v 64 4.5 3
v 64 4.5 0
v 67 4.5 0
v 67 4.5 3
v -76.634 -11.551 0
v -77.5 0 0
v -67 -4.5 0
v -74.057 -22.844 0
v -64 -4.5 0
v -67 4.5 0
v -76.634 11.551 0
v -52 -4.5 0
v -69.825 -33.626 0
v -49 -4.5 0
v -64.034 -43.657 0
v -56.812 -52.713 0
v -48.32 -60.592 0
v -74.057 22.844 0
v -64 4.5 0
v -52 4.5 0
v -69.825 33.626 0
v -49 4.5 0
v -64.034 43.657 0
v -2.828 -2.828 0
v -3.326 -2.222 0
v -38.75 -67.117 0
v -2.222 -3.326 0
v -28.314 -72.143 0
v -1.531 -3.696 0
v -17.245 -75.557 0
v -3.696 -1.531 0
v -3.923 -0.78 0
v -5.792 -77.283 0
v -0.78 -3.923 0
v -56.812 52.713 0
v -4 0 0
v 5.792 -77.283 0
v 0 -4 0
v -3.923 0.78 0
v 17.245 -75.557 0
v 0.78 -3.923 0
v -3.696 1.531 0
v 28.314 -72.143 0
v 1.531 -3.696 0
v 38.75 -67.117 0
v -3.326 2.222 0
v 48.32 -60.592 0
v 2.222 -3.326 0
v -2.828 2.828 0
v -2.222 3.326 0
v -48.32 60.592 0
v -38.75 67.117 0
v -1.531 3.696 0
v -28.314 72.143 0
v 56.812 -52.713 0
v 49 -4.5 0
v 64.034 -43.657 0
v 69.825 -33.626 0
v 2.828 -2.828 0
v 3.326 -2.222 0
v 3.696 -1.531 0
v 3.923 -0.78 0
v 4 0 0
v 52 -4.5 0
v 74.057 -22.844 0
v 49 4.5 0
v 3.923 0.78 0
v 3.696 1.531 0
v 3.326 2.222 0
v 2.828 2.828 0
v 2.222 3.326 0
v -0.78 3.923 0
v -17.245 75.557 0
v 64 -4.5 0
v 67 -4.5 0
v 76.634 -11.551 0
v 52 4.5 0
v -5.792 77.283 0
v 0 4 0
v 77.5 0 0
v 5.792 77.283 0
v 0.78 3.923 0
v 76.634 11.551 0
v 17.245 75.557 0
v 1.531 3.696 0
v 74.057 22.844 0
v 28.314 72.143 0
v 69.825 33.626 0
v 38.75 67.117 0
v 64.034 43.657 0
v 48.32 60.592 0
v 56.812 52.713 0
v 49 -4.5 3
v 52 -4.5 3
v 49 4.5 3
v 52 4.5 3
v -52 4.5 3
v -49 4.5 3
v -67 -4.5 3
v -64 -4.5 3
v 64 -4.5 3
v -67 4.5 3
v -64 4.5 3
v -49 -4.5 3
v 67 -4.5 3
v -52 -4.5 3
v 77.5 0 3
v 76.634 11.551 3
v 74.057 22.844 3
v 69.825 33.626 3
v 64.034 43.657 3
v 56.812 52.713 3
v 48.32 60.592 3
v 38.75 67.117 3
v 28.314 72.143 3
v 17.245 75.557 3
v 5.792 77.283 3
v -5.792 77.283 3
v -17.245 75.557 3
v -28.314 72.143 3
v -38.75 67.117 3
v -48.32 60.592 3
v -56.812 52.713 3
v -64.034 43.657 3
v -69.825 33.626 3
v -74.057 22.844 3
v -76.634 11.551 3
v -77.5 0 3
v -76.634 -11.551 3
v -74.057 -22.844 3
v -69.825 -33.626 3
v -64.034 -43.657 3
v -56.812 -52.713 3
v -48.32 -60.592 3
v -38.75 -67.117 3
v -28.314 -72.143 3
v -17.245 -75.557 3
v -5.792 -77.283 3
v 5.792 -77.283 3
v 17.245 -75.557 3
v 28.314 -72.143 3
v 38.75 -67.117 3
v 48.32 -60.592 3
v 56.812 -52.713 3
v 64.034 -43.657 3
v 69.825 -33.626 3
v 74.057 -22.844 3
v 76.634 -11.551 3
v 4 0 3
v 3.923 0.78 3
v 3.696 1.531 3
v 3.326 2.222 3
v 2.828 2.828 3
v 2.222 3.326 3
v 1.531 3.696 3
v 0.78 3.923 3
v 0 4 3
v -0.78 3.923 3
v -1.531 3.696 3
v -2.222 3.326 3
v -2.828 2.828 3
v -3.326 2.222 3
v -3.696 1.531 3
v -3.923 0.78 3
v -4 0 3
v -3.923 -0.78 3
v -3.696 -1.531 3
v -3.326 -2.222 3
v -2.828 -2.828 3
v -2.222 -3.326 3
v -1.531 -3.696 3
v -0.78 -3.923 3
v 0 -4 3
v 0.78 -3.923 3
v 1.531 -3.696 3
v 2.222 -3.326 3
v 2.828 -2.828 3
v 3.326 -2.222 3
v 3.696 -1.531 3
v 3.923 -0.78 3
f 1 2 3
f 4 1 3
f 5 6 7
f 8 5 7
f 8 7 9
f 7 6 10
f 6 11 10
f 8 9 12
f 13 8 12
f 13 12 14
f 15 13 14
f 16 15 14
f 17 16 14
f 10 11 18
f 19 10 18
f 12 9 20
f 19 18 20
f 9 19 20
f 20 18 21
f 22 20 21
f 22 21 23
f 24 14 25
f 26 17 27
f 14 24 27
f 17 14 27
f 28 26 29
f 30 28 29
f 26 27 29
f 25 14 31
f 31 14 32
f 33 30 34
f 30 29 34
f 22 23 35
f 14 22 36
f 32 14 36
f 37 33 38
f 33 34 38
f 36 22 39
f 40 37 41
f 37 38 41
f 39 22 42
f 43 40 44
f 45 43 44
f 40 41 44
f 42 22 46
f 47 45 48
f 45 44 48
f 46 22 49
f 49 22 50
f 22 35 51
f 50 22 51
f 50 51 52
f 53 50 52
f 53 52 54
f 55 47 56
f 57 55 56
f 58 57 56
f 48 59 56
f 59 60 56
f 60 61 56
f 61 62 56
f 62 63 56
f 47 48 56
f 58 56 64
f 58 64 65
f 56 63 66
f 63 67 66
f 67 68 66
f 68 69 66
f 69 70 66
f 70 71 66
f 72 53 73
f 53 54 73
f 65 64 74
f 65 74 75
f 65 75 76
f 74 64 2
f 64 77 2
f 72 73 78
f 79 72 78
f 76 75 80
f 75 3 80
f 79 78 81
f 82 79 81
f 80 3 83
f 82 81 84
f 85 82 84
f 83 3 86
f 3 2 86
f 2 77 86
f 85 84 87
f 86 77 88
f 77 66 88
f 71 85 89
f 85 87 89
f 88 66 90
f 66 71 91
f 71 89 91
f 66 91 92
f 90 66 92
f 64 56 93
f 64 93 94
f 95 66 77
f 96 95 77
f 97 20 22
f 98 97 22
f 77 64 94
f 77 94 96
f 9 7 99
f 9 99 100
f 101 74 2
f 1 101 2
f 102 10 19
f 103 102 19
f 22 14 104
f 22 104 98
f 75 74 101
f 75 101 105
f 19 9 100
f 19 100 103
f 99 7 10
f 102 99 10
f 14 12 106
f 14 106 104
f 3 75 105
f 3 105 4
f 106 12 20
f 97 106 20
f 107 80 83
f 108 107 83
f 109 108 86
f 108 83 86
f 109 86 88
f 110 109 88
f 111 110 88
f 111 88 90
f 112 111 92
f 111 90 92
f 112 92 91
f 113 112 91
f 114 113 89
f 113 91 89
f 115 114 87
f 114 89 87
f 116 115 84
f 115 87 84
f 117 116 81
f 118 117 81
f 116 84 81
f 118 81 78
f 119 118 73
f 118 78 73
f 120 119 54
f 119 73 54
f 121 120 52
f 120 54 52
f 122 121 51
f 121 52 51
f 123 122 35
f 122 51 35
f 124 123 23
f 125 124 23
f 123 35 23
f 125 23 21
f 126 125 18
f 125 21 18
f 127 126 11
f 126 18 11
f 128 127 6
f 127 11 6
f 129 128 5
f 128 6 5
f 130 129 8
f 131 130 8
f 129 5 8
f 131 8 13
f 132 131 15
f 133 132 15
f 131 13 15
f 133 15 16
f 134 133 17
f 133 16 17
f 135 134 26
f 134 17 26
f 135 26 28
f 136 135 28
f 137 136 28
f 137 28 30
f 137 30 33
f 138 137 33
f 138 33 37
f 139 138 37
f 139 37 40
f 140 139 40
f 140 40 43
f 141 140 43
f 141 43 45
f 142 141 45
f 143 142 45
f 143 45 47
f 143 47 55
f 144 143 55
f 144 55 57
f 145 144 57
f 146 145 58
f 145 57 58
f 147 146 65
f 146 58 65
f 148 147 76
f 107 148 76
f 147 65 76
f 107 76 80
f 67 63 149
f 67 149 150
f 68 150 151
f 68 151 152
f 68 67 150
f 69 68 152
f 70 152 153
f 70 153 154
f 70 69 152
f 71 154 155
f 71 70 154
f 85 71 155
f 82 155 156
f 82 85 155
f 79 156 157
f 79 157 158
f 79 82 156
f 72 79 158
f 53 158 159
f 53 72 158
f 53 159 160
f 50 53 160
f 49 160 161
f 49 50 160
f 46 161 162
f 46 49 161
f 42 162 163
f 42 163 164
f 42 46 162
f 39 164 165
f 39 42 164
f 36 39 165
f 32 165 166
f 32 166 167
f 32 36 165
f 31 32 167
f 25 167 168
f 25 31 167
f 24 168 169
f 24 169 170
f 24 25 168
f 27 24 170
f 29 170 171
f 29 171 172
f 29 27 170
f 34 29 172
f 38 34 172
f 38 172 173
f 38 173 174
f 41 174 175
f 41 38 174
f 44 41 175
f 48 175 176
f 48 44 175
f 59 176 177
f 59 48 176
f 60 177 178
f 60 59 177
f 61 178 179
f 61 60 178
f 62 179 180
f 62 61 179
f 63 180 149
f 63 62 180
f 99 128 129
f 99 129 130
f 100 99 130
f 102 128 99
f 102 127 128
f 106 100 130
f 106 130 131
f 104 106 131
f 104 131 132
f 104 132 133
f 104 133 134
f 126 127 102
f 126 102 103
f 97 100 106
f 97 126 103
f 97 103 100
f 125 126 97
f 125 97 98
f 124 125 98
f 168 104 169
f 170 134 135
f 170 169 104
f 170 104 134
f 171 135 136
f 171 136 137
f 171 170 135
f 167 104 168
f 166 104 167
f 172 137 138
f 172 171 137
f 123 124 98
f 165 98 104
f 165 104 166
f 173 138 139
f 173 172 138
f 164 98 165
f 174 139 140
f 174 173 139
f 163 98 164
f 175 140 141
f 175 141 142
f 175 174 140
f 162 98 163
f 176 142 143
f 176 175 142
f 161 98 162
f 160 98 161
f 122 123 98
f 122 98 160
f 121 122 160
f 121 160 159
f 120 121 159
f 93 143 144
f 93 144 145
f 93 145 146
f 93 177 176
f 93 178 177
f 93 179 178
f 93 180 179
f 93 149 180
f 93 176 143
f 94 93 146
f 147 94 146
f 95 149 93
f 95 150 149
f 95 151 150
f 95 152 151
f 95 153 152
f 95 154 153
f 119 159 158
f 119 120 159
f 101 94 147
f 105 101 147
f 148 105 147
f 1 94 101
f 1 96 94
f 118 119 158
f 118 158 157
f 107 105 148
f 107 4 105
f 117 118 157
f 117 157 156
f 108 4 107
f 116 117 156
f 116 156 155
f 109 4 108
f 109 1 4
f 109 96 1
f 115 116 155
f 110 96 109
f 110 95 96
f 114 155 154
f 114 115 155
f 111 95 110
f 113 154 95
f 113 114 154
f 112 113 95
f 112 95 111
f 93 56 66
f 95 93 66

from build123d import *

# Parameters (mm, degrees)
BOX127_W          = 3
BOX127_H          = 9
BOX127_DEPTH      = 3
BOX128_W          = 3
BOX128_H          = 9
BOX128_DEPTH      = 3
BOX_W             = 3
BOX_H             = 9
BOX_DEPTH         = 3
BOX126_W          = 3
BOX126_H          = 9
BOX126_DEPTH      = 3
CYLINDER017_R     = 4
CYLINDER017_DEPTH = 3
CYLINDER_R        = 77.5
CYLINDER_DEPTH    = 3


with BuildPart() as cube049:
    # Box127 → Box127 (new body)
    with BuildSketch(Plane(origin=(49, -4.5, 0), x_dir=(1, 0, 0), z_dir=(0, 0, 1))):
        with Locations((1.5, 4.5)):
            Rectangle(BOX127_W, BOX127_H)
    extrude(amount=BOX127_DEPTH)


with BuildPart() as cube050:
    # Box128 → Box128 (new body)
    with BuildSketch(Plane(origin=(64, -4.5, 0), x_dir=(1, 0, 0), z_dir=(0, 0, 1))):
        with Locations((1.5, 4.5)):
            Rectangle(BOX128_W, BOX128_H)
    extrude(amount=BOX128_DEPTH)


with BuildPart() as cube:
    # Box → Box (new body)
    with BuildSketch(Plane(origin=(-52, -4.5, 0), x_dir=(1, 0, 0), z_dir=(0, 0, 1))):
        with Locations((1.5, 4.5)):
            Rectangle(BOX_W, BOX_H)
    extrude(amount=BOX_DEPTH)


with BuildPart() as cube048:
    # Box126 → Box126 (new body)
    with BuildSketch(Plane(origin=(-67, -4.5, 0), x_dir=(1, 0, 0), z_dir=(0, 0, 1))):
        with Locations((1.5, 4.5)):
            Rectangle(BOX126_W, BOX126_H)
    extrude(amount=BOX126_DEPTH)


with BuildPart() as cylinder001:
    # Cylinder017 → Cylinder017 (new body)
    with BuildSketch(Plane.XY):
        Circle(CYLINDER017_R)
    extrude(amount=CYLINDER017_DEPTH)


with BuildPart() as cut004:
    # Cylinder → Cylinder (new body)
    with BuildSketch(Plane.XY):
        Circle(CYLINDER_R)
    extrude(amount=CYLINDER_DEPTH)

    # Cut: cut Cylinder001
    add(cylinder001.part, mode=Mode.SUBTRACT)

    # Cut001: cut Cube048
    add(cube048.part, mode=Mode.SUBTRACT)

    # Cut002: cut Cube
    add(cube.part, mode=Mode.SUBTRACT)

    # Cut003: cut Cube050
    add(cube050.part, mode=Mode.SUBTRACT)

    # Cut004: cut Cube049
    add(cube049.part, mode=Mode.SUBTRACT)


solid = cut004.part
